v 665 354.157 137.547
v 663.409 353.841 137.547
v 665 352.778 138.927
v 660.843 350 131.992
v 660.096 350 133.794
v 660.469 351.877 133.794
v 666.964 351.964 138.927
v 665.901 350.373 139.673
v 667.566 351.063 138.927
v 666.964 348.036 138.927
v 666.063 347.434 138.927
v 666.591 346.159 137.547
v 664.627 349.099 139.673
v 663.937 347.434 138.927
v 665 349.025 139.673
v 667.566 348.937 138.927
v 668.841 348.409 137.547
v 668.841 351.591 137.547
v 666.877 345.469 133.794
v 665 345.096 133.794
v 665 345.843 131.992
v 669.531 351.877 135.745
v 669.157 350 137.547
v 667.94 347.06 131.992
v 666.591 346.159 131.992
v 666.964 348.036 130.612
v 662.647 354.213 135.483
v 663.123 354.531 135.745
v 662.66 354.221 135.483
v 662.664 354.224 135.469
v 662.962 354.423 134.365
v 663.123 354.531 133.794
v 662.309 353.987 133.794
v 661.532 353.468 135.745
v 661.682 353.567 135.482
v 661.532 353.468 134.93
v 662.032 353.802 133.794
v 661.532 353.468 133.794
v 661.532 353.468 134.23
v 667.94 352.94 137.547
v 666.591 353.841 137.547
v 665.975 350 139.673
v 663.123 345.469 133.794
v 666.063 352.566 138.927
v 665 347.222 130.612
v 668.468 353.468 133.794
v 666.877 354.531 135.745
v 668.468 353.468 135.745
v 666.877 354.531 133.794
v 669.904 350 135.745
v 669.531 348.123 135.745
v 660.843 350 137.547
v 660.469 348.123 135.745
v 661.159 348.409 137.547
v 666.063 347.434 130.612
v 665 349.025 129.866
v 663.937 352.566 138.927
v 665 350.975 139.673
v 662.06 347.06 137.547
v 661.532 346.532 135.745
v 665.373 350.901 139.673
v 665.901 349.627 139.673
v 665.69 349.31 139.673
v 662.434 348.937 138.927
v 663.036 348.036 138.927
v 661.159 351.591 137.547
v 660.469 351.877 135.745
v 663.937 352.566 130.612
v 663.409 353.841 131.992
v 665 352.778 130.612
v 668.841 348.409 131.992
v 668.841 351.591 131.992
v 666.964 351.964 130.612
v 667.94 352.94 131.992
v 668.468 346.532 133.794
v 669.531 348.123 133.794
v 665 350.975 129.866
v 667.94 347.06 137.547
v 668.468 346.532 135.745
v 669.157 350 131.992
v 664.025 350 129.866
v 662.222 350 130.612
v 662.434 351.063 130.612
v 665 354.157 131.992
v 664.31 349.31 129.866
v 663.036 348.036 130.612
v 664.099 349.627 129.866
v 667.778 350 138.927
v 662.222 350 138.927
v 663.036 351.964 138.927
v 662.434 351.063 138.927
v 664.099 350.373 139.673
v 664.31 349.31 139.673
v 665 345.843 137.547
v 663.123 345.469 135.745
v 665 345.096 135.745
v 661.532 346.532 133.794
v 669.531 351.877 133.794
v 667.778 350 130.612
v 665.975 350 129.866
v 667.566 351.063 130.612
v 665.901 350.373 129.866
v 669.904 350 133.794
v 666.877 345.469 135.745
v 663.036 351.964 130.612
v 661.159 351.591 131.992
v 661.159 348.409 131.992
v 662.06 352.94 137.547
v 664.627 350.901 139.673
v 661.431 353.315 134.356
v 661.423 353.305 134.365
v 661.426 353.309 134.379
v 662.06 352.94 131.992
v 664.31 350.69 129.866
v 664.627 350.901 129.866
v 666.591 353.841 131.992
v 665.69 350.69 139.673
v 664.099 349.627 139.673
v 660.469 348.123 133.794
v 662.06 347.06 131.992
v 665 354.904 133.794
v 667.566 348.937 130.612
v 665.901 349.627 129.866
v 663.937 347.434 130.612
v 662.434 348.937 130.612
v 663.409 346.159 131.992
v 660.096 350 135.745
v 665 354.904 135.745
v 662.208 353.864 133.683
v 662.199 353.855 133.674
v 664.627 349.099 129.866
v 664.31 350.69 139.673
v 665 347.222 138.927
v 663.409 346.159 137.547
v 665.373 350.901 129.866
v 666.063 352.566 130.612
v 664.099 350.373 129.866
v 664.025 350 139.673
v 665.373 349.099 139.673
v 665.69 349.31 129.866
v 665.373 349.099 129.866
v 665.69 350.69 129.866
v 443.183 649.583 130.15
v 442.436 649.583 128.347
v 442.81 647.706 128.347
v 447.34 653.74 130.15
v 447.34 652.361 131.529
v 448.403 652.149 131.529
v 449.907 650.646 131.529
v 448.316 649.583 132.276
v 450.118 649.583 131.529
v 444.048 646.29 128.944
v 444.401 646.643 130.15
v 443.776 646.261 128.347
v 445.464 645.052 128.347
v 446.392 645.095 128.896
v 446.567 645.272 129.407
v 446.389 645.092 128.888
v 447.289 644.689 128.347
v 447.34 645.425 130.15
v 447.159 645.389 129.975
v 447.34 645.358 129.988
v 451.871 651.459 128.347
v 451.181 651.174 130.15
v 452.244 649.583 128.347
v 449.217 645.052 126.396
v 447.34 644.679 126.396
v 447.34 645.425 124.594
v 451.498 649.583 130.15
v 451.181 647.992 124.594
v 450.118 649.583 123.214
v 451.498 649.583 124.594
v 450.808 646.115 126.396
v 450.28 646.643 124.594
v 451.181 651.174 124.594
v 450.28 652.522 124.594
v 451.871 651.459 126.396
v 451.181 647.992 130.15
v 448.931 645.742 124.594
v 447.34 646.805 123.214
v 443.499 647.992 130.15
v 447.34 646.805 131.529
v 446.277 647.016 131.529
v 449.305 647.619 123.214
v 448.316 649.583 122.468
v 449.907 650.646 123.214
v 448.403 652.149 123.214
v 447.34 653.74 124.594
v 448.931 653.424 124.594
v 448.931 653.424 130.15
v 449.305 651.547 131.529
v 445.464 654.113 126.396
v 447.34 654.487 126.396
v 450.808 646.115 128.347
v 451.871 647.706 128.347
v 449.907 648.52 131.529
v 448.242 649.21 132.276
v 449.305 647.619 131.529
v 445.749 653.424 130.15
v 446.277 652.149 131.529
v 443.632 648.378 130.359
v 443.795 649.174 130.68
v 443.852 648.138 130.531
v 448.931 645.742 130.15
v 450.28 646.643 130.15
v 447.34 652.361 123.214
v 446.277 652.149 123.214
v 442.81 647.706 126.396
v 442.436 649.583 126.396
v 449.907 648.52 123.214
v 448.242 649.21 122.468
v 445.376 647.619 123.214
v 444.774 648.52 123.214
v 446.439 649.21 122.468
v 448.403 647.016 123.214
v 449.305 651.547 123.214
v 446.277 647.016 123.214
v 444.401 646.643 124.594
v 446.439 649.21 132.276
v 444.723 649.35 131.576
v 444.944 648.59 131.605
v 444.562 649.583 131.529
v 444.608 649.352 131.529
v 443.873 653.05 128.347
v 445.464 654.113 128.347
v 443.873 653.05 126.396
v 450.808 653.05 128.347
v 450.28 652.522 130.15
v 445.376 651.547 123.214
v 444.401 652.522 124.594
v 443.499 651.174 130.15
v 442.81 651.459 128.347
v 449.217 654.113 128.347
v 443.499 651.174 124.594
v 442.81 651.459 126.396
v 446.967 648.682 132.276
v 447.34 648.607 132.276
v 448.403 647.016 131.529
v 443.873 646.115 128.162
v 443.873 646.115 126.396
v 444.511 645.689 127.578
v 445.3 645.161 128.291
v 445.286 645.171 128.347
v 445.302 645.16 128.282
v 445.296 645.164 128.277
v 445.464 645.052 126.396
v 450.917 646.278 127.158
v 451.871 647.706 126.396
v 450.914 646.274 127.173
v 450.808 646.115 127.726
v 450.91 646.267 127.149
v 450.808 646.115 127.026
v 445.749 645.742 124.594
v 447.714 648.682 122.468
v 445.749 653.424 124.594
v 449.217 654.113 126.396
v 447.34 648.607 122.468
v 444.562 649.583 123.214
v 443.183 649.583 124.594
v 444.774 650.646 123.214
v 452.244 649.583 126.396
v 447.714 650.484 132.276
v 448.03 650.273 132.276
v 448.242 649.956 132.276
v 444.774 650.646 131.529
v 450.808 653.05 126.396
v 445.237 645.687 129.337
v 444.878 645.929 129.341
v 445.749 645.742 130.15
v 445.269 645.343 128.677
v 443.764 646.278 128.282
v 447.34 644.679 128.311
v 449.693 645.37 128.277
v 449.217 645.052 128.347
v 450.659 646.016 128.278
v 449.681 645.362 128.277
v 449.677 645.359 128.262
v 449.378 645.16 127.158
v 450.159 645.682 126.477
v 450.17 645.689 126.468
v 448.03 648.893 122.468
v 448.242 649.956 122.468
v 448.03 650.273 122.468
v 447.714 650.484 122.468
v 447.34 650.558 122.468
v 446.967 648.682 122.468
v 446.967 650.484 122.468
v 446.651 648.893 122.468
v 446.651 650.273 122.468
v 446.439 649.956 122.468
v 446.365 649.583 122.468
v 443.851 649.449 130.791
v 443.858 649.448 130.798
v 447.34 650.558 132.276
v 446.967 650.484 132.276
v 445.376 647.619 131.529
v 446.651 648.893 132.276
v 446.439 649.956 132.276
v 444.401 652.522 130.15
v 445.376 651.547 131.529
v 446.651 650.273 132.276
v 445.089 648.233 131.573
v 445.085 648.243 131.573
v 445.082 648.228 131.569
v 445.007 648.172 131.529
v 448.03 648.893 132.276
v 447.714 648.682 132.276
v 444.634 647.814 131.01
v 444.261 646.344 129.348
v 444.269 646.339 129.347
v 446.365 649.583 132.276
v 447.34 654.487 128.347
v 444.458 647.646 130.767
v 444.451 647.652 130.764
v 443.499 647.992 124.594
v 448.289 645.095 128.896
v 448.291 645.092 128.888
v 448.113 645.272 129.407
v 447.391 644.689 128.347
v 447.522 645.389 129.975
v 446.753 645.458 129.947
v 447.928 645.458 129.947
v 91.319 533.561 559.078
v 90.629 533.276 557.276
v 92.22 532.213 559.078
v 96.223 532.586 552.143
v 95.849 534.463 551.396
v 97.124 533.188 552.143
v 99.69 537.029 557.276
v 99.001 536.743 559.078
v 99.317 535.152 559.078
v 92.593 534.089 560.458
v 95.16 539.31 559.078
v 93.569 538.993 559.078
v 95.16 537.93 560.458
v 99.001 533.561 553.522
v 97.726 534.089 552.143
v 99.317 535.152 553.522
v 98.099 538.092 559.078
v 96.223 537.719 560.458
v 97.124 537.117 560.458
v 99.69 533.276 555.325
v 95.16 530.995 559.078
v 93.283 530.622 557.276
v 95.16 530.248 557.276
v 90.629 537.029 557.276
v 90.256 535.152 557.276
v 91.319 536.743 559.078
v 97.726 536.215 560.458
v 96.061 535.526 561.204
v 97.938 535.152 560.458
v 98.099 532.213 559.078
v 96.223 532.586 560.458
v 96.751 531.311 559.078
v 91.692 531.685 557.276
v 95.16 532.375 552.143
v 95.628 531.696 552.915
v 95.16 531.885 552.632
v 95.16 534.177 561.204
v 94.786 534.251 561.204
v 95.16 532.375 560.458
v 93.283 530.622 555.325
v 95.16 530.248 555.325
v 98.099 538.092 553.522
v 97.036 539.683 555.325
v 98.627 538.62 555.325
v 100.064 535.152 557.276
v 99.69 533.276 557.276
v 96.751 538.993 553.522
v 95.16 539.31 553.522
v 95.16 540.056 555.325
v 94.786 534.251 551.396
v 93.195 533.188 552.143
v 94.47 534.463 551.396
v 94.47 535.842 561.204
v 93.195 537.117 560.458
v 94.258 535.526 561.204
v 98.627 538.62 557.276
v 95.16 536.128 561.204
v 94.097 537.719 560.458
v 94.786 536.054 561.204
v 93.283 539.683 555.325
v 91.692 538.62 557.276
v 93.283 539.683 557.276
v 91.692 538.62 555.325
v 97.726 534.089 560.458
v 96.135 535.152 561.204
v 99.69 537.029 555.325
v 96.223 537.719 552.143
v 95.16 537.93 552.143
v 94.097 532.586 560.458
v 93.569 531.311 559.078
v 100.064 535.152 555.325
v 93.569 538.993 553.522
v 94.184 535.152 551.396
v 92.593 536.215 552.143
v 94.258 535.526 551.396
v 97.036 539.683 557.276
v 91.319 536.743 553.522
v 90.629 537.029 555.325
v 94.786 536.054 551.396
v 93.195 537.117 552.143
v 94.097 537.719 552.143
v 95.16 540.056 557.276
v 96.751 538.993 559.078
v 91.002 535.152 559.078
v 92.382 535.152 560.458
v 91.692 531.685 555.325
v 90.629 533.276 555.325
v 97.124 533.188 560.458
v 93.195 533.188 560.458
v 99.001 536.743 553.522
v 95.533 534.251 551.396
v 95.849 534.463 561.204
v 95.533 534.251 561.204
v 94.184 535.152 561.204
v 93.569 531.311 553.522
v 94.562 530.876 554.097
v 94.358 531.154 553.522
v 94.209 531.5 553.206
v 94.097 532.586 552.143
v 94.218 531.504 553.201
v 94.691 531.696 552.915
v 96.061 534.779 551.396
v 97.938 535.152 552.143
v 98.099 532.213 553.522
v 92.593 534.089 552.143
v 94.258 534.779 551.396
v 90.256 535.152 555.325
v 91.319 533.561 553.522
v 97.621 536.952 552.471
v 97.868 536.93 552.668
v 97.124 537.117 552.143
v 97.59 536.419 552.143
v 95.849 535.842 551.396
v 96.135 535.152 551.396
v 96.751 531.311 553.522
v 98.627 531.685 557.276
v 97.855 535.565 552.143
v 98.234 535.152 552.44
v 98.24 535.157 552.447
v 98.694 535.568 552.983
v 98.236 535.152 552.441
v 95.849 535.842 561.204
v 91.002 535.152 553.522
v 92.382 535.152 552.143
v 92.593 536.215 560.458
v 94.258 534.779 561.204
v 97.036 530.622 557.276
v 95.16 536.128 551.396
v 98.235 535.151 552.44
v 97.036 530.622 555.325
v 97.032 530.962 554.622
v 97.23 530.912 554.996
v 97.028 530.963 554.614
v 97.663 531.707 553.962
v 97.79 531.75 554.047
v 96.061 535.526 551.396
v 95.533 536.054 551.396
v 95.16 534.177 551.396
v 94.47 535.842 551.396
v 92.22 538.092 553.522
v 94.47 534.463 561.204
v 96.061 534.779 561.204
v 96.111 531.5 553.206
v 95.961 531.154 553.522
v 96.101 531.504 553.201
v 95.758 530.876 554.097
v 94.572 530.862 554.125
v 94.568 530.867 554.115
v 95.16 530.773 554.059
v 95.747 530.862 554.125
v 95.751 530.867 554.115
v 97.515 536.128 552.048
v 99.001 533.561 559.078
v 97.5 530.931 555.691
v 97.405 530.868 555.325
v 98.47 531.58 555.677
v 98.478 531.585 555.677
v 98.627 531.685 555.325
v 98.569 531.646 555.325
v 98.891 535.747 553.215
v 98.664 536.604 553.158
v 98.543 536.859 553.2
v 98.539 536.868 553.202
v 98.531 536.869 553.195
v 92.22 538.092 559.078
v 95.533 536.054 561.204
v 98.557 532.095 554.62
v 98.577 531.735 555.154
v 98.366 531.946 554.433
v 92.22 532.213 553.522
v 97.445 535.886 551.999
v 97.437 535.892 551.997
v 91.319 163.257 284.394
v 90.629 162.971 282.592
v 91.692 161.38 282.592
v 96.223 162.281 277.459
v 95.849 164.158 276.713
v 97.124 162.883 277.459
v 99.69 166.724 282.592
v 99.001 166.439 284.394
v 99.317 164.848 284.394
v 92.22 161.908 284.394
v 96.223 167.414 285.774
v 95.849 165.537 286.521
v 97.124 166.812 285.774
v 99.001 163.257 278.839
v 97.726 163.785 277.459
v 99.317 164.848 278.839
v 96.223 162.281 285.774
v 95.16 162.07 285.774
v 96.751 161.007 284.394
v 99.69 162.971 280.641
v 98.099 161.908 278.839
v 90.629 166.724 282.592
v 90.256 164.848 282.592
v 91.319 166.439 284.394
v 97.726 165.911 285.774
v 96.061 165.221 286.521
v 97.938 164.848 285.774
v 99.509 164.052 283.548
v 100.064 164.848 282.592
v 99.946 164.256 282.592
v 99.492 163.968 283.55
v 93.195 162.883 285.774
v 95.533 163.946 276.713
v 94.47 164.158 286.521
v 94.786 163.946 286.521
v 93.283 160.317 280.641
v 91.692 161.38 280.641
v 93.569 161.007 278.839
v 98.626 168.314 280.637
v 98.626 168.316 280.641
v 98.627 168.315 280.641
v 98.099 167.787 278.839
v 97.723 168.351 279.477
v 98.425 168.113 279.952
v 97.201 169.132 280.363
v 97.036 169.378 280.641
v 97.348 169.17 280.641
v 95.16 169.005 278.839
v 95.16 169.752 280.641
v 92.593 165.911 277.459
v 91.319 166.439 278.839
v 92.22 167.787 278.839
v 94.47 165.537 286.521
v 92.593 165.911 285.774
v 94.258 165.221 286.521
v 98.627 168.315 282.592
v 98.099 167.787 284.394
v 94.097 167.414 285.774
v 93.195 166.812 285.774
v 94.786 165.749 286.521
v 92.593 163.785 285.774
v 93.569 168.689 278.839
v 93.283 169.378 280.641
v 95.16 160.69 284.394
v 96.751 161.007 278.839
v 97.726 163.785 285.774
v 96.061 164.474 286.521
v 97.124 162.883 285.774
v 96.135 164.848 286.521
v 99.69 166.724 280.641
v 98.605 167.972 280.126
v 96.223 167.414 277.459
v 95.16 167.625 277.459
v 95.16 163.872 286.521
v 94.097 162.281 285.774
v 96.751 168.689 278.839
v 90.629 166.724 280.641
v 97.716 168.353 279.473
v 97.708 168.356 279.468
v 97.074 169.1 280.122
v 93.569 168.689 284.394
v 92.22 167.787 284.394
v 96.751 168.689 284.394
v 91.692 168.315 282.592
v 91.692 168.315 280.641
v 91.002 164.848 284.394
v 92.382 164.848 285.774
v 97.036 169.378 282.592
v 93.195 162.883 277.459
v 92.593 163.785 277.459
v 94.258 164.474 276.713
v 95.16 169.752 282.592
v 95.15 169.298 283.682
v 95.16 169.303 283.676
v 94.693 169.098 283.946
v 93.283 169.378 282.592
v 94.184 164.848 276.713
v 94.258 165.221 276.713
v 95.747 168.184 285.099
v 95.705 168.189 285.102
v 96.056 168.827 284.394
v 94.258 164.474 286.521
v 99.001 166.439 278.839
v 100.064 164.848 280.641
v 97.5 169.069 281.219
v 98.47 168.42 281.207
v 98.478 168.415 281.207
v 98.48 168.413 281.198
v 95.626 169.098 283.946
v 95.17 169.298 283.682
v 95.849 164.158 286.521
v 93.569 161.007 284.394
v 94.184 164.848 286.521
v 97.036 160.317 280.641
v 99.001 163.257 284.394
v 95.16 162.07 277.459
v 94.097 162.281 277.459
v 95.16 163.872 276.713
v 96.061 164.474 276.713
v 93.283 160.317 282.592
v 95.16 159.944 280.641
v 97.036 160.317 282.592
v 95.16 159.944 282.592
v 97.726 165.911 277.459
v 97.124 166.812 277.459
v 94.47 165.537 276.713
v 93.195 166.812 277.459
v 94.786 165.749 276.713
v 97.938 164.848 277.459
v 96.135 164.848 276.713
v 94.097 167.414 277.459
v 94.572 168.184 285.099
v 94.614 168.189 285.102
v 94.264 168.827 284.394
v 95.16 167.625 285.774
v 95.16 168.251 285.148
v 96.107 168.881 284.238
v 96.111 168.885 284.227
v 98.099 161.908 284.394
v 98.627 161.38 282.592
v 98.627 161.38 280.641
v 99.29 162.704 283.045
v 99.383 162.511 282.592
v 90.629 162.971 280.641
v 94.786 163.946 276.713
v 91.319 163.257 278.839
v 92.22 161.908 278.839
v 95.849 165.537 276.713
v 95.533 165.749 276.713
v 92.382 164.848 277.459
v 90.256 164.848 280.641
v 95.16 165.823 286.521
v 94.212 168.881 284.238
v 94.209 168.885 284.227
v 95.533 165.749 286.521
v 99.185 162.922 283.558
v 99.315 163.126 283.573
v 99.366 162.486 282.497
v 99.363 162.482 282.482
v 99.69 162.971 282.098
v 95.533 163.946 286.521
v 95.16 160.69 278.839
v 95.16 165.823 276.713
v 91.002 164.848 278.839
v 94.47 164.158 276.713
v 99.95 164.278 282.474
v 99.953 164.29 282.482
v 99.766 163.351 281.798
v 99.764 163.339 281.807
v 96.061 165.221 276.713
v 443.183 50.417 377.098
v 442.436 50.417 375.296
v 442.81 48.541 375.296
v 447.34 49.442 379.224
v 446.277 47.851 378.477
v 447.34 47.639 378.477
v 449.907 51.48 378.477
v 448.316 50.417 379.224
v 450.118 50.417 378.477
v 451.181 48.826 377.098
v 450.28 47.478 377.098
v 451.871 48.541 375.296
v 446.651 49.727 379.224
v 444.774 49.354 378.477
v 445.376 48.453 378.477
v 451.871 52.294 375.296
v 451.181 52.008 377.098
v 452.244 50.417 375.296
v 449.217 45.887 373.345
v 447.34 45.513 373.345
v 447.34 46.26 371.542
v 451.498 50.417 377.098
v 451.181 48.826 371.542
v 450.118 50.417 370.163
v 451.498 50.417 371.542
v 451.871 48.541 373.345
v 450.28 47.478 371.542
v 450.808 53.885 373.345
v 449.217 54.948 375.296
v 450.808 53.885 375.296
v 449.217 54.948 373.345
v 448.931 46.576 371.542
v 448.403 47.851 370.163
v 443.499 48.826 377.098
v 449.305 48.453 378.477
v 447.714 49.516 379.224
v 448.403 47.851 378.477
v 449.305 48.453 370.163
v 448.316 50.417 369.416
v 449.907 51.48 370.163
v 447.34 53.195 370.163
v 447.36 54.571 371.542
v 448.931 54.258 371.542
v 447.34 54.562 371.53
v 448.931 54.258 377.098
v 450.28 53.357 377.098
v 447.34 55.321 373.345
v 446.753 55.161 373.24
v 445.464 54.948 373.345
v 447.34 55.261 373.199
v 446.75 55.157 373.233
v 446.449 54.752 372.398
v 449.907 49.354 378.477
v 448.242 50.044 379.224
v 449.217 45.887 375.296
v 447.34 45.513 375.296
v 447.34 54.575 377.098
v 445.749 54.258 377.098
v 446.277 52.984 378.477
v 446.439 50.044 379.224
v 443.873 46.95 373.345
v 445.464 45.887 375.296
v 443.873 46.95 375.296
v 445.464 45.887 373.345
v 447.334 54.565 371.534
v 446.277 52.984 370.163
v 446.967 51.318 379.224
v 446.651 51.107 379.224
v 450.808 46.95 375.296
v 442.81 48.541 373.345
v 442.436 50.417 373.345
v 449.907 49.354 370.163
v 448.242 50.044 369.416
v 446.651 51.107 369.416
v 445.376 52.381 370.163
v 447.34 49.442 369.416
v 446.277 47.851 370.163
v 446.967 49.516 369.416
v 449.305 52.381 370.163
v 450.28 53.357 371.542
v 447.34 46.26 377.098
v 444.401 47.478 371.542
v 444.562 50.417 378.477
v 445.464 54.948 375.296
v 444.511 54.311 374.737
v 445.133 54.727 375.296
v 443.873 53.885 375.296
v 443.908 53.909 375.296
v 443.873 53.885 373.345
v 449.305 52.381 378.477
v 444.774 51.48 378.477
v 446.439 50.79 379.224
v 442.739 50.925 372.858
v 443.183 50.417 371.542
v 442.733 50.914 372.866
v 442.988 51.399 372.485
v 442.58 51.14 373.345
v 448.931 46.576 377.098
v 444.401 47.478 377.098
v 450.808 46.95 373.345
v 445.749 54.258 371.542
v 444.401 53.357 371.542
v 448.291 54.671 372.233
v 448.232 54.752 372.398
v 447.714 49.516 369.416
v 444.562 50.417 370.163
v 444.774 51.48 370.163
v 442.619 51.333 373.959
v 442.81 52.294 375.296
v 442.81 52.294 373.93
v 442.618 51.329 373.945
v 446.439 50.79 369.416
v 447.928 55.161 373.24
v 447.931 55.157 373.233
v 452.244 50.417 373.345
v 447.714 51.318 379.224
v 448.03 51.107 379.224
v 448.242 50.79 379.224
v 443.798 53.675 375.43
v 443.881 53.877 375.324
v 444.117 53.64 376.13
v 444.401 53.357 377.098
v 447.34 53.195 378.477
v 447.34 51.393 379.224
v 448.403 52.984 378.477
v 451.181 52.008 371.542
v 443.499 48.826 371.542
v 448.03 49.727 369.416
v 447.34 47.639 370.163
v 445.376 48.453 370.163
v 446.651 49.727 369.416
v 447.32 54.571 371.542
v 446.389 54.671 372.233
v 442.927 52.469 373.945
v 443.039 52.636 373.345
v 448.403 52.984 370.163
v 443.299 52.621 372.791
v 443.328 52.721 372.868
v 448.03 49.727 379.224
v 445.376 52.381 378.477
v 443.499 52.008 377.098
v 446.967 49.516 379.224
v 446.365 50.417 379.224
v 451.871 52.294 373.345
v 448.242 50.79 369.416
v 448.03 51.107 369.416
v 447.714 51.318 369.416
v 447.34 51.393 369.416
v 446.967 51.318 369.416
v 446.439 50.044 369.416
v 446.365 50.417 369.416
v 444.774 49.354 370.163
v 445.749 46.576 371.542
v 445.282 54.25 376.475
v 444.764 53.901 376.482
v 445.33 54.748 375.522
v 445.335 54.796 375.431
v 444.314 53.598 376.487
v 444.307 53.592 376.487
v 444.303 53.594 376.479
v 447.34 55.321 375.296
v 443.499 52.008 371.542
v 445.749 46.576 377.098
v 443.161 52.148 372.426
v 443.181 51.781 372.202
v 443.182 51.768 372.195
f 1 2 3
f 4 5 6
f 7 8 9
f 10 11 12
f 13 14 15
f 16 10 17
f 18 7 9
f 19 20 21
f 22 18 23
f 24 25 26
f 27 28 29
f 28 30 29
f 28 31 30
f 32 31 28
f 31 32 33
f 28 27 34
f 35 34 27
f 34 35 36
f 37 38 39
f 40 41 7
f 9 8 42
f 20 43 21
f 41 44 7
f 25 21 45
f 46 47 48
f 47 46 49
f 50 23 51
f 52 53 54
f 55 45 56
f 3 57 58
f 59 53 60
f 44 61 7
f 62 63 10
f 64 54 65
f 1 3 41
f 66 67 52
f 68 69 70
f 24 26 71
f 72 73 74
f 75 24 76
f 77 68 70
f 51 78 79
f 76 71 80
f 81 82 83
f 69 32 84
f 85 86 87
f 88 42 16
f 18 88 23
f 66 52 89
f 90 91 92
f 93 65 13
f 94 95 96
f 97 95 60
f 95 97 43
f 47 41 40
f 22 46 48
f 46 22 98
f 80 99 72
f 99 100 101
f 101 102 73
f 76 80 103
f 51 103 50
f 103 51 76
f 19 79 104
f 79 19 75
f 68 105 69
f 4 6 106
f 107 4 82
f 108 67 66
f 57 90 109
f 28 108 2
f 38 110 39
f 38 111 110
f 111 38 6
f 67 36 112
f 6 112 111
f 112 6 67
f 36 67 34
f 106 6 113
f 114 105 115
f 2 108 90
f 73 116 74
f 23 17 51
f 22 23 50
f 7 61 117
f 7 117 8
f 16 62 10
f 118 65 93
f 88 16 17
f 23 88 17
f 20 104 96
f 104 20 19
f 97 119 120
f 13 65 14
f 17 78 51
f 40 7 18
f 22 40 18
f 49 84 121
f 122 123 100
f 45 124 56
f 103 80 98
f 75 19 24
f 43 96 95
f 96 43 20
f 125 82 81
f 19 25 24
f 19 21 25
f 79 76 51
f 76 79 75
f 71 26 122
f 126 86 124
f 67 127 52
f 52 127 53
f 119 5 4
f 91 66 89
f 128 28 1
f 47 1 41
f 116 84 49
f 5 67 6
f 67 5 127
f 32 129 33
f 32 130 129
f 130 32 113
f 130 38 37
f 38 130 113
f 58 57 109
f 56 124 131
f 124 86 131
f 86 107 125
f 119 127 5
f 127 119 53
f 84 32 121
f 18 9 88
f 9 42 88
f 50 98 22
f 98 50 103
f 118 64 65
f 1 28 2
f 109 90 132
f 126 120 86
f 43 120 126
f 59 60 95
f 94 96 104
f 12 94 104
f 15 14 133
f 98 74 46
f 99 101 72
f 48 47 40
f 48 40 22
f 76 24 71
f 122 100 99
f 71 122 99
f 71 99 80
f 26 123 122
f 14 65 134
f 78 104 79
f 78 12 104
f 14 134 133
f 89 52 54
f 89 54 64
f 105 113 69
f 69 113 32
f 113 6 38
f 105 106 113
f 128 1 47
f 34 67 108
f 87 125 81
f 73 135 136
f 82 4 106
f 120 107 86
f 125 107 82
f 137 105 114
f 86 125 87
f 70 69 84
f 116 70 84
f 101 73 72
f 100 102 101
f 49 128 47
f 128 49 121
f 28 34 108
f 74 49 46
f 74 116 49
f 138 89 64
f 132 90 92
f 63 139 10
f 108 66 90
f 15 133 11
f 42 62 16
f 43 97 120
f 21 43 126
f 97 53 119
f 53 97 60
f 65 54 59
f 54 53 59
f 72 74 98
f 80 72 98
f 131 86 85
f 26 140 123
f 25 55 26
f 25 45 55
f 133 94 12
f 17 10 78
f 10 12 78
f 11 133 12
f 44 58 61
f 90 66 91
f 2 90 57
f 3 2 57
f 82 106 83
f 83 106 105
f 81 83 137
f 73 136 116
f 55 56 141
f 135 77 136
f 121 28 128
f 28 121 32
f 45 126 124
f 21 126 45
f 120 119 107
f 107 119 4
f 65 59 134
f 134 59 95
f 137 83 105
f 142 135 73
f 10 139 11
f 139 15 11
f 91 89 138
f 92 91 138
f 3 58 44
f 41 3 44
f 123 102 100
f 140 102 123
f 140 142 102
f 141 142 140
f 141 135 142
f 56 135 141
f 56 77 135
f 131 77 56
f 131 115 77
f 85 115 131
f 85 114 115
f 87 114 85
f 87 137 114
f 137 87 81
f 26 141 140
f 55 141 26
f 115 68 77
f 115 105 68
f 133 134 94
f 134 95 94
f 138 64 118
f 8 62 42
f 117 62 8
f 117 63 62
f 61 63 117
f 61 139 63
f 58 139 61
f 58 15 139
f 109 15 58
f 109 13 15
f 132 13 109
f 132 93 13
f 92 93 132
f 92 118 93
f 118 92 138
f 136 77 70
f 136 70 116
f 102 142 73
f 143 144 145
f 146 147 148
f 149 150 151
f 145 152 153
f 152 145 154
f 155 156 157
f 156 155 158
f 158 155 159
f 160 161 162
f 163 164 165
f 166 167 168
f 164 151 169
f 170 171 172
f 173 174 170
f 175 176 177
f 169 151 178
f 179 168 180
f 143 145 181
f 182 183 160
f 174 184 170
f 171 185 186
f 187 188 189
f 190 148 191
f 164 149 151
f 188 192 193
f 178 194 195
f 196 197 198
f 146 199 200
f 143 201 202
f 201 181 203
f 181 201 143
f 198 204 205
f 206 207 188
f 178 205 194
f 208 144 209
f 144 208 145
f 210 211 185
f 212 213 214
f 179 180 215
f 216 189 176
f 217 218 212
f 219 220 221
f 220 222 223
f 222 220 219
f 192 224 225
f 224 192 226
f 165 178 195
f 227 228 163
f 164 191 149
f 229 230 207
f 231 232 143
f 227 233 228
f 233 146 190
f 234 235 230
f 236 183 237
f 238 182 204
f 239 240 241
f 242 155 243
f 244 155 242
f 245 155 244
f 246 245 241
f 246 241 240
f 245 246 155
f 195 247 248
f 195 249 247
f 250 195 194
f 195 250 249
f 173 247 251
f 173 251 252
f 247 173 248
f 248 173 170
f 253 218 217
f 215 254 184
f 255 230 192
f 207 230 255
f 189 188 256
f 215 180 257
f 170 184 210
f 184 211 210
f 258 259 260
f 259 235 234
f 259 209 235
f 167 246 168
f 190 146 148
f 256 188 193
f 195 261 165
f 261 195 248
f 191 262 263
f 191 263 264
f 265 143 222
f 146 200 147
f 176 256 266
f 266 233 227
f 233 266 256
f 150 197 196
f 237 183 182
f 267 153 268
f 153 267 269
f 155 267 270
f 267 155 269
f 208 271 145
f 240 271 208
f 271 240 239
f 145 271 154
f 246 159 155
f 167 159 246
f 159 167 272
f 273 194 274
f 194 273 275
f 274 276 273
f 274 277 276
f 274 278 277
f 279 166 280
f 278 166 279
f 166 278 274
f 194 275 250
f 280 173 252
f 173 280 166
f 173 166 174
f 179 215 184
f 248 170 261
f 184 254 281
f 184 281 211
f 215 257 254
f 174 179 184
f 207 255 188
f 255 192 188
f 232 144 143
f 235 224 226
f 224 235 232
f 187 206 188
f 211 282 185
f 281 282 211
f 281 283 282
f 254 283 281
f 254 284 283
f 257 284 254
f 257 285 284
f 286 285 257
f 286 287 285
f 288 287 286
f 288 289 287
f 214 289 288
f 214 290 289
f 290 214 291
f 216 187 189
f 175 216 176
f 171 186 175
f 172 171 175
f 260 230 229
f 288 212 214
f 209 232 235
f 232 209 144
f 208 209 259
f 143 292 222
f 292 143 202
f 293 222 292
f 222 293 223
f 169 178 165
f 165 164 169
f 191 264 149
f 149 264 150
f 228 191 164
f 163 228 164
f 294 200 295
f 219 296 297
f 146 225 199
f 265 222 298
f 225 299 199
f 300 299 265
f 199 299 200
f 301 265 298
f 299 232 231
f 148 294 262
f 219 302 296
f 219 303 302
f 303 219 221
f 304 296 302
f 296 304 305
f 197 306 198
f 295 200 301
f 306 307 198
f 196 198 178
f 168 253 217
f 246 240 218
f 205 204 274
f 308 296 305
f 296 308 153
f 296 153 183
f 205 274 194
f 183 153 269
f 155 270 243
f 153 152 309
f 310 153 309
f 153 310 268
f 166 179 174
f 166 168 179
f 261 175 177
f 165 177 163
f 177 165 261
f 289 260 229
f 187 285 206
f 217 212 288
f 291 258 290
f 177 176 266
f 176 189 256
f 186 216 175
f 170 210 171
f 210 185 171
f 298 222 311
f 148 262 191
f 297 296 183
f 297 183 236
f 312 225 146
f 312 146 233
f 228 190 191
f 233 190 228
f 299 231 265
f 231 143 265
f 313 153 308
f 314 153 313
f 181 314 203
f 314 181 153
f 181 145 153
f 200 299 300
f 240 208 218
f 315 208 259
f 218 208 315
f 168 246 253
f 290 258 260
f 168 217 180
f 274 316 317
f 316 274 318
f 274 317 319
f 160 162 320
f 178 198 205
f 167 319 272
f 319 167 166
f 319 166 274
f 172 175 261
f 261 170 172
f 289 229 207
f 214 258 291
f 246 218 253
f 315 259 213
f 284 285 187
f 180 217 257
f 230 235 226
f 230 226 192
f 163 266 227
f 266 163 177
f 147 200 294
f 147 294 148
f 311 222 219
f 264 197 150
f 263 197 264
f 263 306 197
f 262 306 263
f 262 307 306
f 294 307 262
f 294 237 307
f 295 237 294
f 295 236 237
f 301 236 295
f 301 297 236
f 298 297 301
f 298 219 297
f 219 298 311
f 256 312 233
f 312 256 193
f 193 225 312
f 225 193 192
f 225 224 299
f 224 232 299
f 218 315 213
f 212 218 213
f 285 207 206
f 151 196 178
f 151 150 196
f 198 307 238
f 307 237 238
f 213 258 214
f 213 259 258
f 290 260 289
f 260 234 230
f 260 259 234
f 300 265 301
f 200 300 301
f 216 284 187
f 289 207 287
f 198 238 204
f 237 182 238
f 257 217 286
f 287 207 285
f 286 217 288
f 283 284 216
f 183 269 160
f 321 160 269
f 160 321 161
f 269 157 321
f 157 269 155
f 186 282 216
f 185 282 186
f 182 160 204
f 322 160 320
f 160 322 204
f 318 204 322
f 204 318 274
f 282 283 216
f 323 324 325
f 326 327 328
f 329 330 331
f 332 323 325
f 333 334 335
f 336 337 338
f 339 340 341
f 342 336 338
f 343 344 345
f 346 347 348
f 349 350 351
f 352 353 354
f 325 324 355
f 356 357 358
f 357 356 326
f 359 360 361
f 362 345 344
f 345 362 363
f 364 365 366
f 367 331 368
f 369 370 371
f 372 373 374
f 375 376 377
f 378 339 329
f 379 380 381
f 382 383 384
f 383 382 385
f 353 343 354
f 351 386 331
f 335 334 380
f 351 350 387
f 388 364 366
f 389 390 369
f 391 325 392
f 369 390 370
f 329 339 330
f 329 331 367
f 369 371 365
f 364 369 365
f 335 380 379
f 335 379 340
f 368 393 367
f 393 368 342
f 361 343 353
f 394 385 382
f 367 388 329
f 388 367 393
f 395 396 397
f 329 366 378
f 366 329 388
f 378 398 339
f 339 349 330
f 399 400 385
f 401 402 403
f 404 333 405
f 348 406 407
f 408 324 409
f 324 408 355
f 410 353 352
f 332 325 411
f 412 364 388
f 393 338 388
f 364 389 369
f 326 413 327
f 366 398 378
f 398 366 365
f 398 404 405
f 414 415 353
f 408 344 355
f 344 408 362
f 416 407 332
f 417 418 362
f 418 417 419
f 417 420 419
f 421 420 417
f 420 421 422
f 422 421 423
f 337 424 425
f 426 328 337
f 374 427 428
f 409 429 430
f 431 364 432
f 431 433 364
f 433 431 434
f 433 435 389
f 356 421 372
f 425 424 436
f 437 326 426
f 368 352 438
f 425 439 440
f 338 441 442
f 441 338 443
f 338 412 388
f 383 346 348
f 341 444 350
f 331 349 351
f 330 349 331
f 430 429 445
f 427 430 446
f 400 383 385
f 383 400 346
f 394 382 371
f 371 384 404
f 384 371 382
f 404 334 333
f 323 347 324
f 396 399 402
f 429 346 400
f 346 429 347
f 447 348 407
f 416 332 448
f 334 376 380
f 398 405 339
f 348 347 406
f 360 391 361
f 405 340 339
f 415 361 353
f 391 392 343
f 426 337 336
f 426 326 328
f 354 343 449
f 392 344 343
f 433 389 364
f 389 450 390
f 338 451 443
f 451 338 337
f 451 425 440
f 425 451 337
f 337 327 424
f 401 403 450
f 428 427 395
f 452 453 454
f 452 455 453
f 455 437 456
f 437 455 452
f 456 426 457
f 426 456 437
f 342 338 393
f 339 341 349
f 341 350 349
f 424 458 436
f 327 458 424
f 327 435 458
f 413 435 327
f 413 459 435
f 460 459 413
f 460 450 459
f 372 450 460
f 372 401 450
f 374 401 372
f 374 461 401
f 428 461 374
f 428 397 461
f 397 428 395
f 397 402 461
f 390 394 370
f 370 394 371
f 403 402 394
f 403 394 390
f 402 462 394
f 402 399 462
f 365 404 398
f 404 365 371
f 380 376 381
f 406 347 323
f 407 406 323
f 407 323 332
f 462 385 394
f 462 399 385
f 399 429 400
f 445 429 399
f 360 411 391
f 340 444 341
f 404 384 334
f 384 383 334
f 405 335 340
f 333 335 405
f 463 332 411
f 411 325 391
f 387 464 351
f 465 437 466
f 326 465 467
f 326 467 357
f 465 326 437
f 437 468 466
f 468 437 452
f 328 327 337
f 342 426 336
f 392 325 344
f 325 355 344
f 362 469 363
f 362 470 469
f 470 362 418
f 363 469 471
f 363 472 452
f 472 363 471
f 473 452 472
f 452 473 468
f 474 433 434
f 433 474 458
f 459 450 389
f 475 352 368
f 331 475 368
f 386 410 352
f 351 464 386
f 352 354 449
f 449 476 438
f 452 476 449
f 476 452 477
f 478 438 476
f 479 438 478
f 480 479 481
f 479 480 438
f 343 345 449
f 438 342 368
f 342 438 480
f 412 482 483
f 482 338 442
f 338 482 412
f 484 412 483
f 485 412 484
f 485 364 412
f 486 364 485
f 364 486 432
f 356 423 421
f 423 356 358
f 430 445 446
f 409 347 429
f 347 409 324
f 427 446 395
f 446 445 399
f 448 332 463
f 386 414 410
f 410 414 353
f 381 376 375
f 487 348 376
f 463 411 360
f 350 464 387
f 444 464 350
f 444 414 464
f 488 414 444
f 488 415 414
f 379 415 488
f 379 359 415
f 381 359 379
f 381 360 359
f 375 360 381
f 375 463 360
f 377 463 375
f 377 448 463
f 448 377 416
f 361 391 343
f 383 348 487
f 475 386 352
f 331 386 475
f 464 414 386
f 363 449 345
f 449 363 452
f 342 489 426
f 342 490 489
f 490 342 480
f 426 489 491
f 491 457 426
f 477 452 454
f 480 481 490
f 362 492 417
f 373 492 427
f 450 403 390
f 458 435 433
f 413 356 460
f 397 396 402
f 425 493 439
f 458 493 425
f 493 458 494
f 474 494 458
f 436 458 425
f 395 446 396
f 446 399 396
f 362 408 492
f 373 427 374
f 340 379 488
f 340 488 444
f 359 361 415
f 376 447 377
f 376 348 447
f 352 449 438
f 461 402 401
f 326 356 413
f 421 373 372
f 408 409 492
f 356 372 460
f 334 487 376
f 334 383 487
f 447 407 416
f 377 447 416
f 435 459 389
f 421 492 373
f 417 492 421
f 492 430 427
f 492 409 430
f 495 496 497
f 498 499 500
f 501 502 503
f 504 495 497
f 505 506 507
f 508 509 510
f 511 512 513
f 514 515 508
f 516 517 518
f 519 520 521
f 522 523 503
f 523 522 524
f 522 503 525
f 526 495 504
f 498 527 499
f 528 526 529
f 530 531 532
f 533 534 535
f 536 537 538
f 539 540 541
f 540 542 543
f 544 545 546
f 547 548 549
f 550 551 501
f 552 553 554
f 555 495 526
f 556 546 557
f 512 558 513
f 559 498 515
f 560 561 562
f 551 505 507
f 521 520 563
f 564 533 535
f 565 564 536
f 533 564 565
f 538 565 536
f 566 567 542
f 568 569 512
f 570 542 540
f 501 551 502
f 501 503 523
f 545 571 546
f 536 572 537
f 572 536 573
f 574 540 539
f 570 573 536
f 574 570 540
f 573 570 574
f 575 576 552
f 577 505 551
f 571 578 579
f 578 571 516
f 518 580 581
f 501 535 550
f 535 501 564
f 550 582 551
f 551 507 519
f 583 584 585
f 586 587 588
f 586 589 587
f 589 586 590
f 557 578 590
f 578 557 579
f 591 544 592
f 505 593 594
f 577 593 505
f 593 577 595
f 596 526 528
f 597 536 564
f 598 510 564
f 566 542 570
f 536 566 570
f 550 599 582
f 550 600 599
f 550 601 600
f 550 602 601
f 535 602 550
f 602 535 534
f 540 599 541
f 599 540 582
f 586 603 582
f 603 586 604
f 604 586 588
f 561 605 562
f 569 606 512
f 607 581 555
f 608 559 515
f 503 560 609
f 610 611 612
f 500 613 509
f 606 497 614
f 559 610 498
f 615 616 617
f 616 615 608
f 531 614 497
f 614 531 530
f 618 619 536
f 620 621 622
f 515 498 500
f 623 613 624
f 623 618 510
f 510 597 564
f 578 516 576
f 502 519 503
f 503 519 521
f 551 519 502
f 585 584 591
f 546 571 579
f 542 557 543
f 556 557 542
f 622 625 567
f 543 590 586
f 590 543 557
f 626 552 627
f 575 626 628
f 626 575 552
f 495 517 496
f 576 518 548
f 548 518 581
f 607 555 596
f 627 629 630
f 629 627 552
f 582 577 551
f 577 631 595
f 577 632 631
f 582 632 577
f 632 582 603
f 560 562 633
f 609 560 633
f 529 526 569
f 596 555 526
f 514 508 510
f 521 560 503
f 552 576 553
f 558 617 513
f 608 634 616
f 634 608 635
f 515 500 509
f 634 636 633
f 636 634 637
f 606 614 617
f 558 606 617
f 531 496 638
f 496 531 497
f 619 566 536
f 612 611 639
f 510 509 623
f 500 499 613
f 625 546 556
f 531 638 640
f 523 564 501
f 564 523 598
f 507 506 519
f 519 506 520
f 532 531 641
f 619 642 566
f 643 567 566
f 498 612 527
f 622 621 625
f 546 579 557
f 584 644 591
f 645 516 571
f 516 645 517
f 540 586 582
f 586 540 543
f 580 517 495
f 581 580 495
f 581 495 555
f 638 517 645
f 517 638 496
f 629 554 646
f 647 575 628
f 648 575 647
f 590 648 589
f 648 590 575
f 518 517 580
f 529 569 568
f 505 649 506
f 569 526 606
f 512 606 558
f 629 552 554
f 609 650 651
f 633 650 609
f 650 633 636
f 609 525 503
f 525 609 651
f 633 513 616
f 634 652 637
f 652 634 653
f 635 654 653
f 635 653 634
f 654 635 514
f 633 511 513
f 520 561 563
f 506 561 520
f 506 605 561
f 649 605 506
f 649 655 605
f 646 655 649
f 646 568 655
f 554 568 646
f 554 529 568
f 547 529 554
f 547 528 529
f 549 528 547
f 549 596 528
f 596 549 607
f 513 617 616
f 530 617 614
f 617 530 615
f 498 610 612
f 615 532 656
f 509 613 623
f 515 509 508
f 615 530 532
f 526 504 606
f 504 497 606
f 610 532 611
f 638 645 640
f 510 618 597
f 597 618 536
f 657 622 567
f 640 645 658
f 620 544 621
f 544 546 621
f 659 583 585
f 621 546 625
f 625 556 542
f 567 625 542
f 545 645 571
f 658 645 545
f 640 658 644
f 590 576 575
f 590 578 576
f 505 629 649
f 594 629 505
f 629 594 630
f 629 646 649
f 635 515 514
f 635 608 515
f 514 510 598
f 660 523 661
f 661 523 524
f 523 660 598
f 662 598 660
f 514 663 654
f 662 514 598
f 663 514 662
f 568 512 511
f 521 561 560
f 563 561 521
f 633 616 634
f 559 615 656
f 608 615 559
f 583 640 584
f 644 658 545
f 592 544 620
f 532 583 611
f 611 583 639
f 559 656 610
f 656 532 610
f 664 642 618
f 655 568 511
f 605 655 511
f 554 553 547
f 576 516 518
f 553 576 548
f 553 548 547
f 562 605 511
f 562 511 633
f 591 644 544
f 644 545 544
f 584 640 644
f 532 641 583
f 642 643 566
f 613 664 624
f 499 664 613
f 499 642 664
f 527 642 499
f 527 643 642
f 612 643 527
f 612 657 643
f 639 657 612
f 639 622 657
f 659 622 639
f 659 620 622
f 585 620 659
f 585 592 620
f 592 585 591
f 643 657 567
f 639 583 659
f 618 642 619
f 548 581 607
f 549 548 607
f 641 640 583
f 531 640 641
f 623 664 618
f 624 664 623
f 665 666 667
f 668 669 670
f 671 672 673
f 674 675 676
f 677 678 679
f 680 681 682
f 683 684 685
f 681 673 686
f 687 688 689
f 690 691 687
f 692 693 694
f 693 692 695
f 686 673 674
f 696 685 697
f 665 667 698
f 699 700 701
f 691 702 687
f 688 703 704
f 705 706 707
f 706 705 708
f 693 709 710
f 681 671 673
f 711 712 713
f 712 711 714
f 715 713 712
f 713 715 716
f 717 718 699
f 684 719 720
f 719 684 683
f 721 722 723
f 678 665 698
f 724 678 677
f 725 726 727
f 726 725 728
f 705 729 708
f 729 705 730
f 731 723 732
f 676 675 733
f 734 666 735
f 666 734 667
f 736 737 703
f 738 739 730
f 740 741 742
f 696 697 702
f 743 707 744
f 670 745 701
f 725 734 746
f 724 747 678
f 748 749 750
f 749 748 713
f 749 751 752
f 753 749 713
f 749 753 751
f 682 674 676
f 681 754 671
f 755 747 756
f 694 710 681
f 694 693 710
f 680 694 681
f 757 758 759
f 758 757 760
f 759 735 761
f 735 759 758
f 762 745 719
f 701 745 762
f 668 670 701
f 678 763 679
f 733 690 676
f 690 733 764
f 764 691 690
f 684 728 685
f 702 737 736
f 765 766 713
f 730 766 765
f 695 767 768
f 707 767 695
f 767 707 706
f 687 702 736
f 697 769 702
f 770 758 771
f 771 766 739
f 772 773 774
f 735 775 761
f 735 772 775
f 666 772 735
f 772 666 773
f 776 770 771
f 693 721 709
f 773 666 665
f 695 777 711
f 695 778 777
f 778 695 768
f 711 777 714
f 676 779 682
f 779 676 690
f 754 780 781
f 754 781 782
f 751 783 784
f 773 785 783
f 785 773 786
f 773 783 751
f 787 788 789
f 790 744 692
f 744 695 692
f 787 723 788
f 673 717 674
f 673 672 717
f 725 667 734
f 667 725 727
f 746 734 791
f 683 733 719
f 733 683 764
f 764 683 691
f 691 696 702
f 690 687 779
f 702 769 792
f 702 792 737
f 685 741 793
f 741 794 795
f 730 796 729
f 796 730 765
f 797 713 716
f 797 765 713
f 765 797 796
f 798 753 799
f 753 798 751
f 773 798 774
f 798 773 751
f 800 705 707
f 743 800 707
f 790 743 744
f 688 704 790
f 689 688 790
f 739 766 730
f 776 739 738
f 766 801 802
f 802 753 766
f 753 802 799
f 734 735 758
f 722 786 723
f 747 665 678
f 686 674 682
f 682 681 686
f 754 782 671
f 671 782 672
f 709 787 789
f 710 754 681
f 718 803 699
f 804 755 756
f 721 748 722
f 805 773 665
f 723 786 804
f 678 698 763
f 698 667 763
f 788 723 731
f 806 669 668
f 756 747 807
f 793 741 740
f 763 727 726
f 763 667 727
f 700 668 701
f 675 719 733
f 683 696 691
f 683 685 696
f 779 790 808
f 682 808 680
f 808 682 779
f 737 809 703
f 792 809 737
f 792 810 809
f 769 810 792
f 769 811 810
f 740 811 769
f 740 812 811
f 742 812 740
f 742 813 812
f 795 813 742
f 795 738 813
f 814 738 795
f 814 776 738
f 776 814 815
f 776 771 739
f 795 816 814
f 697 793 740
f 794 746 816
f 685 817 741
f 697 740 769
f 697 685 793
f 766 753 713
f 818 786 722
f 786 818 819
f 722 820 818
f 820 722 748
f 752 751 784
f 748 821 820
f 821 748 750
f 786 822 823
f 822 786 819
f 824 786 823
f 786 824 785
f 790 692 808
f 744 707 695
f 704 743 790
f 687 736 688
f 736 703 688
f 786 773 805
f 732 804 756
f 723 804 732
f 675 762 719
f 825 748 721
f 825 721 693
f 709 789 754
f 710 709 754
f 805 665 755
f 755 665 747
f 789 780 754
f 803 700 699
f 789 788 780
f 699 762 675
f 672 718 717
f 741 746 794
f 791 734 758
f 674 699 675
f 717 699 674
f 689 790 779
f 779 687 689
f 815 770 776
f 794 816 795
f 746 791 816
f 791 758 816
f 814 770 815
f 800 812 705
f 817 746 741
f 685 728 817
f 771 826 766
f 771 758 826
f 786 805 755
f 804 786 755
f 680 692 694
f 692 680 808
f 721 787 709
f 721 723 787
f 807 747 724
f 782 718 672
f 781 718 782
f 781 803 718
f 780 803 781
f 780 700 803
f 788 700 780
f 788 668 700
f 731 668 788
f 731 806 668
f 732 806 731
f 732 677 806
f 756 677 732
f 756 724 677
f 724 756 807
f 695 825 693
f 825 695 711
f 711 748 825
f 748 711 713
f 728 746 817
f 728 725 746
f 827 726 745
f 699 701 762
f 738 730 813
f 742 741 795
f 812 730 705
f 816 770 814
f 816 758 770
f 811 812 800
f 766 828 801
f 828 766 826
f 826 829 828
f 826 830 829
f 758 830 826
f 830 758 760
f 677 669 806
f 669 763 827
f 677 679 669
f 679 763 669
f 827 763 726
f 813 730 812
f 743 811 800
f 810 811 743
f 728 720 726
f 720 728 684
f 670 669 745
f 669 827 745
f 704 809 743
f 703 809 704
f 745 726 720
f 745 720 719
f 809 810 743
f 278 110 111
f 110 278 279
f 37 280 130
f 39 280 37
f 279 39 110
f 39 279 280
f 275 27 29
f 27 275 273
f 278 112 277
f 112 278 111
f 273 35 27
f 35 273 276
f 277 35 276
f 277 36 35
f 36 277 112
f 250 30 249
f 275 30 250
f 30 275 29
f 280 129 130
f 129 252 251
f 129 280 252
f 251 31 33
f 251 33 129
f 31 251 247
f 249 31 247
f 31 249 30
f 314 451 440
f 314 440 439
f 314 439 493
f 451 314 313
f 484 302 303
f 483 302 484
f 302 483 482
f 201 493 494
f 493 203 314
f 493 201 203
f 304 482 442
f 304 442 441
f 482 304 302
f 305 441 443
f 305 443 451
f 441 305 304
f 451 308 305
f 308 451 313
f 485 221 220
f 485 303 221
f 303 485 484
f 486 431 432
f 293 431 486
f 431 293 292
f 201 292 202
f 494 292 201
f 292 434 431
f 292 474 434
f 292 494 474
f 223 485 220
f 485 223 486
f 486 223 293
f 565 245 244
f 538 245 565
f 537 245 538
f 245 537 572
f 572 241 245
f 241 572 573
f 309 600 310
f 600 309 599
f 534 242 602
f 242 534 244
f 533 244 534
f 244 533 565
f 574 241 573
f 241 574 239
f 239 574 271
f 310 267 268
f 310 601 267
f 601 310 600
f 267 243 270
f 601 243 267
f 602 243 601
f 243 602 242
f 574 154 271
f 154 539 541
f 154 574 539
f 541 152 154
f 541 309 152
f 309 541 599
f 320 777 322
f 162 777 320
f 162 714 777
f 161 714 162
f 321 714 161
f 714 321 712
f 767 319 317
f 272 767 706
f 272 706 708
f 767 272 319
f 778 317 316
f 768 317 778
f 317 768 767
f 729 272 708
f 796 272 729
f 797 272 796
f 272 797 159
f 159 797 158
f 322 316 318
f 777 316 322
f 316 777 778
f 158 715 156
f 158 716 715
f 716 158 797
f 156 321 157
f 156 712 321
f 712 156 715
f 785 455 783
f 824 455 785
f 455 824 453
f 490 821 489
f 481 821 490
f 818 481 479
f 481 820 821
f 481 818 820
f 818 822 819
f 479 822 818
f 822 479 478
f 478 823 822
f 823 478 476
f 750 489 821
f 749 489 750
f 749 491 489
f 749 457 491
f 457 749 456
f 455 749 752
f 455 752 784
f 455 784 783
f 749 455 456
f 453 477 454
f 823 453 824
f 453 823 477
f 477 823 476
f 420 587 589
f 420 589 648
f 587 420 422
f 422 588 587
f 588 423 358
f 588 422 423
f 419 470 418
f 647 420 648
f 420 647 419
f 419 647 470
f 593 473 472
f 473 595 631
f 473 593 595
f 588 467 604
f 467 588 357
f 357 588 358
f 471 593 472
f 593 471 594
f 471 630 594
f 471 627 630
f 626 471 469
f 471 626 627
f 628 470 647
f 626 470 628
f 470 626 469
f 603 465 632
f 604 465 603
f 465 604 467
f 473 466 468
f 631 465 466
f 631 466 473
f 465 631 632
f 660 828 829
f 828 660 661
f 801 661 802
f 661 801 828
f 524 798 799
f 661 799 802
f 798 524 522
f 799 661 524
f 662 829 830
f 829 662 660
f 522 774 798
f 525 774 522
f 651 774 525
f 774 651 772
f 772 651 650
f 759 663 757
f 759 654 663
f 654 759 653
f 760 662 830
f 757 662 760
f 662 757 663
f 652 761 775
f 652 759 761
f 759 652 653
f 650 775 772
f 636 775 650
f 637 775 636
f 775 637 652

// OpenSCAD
// Define the node renderer.
//  Parameters:
//  n - the index in the nodes table of the node to render
module renderNode(n) {
    translate(nodeCoordinates[n]) sphere(r = 5, center = true);
};

// Define the edge renderer.
//  Parameters:
//  src - the index in the nodes table of the source node
//  dst - the index in the nodes table of the destination node
module renderEdge(src, dst) {

    // Find the source and destination node coordinates.
    srcNode  = nodeCoordinates[src];
    destNode = nodeCoordinates[dst];

    // Find the vector connecting the source and destination node coordinates.
	diff = [destNode[0] - srcNode[0], destNode[1] - srcNode[1], destNode[2] - srcNode[2]];

    // Find the distance between the source and destination node coordinates.
	length = sqrt(pow(diff[0], 2) + pow(diff[1], 2) + pow(diff[2], 2));

    // Move to the starting point.
	translate(diff / 2 + srcNode) {

        // Rotate around the Z axis.
        rotate([0, 0, atan2(diff[1], diff[0])]) {

            // Rotate around the Y axis.
            rotate([0, atan2(sqrt(pow(diff[0], 2) + pow(diff[1], 2)), diff[2]), 0]) {

                // Draw the edge.
                cylinder(h = length, r = 1.0, center = true);

            }

        }

    }

};

// Define the list of node coordinates.
nodeCoordinates = [
[665.0, 350.0, 134.7695528948506], 
[447.3403532281084, 649.5828026329734, 127.37176797445346], 
[95.1596467718916, 535.1523544721291, 556.3002993937216], 
[95.15964677189154, 164.847645527871, 281.61662385685736], 
[447.34035322810837, 50.417197367026574, 374.3200753406128]
];

// Define the list of node identifiers.
nodeIdentifiers = [
[0, 0], 
[1, 1], 
[2, 2], 
[3, 3], 
[4, 4]
];

// Define the list of edges.
edgeIdentifiers = [
[1, 0, 0], 
[2, 0, 1], 
[3, 1, 0], 
[4, 1, 2], 
[5, 1, 3], 
[6, 1, 4], 
[7, 1, 0], 
[8, 1, 2], 
[9, 1, 3], 
[10, 1, 4], 
[11, 3, 1], 
[12, 3, 3], 
[13, 1, 2], 
[14, 1, 3], 
[15, 2, 1], 
[16, 2, 4], 
[17, 3, 1], 
[18, 3, 2], 
[19, 3, 3], 
[20, 3, 4], 
[21, 4, 1], 
[22, 4, 4]
];

// Render the network nodes.
for (nodeIndex = [0 : len(nodeCoordinates) - 1] ) {
renderNode(nodeIndex);
};

// Render the network edges.
for (edgeIndex = [0 : len(edgeIdentifiers) - 1] ) {
renderEdge(
    lookup(edgeIdentifiers[edgeIndex][1], nodeIdentifiers),
    lookup(edgeIdentifiers[edgeIndex][2], nodeIdentifiers)
);
};
